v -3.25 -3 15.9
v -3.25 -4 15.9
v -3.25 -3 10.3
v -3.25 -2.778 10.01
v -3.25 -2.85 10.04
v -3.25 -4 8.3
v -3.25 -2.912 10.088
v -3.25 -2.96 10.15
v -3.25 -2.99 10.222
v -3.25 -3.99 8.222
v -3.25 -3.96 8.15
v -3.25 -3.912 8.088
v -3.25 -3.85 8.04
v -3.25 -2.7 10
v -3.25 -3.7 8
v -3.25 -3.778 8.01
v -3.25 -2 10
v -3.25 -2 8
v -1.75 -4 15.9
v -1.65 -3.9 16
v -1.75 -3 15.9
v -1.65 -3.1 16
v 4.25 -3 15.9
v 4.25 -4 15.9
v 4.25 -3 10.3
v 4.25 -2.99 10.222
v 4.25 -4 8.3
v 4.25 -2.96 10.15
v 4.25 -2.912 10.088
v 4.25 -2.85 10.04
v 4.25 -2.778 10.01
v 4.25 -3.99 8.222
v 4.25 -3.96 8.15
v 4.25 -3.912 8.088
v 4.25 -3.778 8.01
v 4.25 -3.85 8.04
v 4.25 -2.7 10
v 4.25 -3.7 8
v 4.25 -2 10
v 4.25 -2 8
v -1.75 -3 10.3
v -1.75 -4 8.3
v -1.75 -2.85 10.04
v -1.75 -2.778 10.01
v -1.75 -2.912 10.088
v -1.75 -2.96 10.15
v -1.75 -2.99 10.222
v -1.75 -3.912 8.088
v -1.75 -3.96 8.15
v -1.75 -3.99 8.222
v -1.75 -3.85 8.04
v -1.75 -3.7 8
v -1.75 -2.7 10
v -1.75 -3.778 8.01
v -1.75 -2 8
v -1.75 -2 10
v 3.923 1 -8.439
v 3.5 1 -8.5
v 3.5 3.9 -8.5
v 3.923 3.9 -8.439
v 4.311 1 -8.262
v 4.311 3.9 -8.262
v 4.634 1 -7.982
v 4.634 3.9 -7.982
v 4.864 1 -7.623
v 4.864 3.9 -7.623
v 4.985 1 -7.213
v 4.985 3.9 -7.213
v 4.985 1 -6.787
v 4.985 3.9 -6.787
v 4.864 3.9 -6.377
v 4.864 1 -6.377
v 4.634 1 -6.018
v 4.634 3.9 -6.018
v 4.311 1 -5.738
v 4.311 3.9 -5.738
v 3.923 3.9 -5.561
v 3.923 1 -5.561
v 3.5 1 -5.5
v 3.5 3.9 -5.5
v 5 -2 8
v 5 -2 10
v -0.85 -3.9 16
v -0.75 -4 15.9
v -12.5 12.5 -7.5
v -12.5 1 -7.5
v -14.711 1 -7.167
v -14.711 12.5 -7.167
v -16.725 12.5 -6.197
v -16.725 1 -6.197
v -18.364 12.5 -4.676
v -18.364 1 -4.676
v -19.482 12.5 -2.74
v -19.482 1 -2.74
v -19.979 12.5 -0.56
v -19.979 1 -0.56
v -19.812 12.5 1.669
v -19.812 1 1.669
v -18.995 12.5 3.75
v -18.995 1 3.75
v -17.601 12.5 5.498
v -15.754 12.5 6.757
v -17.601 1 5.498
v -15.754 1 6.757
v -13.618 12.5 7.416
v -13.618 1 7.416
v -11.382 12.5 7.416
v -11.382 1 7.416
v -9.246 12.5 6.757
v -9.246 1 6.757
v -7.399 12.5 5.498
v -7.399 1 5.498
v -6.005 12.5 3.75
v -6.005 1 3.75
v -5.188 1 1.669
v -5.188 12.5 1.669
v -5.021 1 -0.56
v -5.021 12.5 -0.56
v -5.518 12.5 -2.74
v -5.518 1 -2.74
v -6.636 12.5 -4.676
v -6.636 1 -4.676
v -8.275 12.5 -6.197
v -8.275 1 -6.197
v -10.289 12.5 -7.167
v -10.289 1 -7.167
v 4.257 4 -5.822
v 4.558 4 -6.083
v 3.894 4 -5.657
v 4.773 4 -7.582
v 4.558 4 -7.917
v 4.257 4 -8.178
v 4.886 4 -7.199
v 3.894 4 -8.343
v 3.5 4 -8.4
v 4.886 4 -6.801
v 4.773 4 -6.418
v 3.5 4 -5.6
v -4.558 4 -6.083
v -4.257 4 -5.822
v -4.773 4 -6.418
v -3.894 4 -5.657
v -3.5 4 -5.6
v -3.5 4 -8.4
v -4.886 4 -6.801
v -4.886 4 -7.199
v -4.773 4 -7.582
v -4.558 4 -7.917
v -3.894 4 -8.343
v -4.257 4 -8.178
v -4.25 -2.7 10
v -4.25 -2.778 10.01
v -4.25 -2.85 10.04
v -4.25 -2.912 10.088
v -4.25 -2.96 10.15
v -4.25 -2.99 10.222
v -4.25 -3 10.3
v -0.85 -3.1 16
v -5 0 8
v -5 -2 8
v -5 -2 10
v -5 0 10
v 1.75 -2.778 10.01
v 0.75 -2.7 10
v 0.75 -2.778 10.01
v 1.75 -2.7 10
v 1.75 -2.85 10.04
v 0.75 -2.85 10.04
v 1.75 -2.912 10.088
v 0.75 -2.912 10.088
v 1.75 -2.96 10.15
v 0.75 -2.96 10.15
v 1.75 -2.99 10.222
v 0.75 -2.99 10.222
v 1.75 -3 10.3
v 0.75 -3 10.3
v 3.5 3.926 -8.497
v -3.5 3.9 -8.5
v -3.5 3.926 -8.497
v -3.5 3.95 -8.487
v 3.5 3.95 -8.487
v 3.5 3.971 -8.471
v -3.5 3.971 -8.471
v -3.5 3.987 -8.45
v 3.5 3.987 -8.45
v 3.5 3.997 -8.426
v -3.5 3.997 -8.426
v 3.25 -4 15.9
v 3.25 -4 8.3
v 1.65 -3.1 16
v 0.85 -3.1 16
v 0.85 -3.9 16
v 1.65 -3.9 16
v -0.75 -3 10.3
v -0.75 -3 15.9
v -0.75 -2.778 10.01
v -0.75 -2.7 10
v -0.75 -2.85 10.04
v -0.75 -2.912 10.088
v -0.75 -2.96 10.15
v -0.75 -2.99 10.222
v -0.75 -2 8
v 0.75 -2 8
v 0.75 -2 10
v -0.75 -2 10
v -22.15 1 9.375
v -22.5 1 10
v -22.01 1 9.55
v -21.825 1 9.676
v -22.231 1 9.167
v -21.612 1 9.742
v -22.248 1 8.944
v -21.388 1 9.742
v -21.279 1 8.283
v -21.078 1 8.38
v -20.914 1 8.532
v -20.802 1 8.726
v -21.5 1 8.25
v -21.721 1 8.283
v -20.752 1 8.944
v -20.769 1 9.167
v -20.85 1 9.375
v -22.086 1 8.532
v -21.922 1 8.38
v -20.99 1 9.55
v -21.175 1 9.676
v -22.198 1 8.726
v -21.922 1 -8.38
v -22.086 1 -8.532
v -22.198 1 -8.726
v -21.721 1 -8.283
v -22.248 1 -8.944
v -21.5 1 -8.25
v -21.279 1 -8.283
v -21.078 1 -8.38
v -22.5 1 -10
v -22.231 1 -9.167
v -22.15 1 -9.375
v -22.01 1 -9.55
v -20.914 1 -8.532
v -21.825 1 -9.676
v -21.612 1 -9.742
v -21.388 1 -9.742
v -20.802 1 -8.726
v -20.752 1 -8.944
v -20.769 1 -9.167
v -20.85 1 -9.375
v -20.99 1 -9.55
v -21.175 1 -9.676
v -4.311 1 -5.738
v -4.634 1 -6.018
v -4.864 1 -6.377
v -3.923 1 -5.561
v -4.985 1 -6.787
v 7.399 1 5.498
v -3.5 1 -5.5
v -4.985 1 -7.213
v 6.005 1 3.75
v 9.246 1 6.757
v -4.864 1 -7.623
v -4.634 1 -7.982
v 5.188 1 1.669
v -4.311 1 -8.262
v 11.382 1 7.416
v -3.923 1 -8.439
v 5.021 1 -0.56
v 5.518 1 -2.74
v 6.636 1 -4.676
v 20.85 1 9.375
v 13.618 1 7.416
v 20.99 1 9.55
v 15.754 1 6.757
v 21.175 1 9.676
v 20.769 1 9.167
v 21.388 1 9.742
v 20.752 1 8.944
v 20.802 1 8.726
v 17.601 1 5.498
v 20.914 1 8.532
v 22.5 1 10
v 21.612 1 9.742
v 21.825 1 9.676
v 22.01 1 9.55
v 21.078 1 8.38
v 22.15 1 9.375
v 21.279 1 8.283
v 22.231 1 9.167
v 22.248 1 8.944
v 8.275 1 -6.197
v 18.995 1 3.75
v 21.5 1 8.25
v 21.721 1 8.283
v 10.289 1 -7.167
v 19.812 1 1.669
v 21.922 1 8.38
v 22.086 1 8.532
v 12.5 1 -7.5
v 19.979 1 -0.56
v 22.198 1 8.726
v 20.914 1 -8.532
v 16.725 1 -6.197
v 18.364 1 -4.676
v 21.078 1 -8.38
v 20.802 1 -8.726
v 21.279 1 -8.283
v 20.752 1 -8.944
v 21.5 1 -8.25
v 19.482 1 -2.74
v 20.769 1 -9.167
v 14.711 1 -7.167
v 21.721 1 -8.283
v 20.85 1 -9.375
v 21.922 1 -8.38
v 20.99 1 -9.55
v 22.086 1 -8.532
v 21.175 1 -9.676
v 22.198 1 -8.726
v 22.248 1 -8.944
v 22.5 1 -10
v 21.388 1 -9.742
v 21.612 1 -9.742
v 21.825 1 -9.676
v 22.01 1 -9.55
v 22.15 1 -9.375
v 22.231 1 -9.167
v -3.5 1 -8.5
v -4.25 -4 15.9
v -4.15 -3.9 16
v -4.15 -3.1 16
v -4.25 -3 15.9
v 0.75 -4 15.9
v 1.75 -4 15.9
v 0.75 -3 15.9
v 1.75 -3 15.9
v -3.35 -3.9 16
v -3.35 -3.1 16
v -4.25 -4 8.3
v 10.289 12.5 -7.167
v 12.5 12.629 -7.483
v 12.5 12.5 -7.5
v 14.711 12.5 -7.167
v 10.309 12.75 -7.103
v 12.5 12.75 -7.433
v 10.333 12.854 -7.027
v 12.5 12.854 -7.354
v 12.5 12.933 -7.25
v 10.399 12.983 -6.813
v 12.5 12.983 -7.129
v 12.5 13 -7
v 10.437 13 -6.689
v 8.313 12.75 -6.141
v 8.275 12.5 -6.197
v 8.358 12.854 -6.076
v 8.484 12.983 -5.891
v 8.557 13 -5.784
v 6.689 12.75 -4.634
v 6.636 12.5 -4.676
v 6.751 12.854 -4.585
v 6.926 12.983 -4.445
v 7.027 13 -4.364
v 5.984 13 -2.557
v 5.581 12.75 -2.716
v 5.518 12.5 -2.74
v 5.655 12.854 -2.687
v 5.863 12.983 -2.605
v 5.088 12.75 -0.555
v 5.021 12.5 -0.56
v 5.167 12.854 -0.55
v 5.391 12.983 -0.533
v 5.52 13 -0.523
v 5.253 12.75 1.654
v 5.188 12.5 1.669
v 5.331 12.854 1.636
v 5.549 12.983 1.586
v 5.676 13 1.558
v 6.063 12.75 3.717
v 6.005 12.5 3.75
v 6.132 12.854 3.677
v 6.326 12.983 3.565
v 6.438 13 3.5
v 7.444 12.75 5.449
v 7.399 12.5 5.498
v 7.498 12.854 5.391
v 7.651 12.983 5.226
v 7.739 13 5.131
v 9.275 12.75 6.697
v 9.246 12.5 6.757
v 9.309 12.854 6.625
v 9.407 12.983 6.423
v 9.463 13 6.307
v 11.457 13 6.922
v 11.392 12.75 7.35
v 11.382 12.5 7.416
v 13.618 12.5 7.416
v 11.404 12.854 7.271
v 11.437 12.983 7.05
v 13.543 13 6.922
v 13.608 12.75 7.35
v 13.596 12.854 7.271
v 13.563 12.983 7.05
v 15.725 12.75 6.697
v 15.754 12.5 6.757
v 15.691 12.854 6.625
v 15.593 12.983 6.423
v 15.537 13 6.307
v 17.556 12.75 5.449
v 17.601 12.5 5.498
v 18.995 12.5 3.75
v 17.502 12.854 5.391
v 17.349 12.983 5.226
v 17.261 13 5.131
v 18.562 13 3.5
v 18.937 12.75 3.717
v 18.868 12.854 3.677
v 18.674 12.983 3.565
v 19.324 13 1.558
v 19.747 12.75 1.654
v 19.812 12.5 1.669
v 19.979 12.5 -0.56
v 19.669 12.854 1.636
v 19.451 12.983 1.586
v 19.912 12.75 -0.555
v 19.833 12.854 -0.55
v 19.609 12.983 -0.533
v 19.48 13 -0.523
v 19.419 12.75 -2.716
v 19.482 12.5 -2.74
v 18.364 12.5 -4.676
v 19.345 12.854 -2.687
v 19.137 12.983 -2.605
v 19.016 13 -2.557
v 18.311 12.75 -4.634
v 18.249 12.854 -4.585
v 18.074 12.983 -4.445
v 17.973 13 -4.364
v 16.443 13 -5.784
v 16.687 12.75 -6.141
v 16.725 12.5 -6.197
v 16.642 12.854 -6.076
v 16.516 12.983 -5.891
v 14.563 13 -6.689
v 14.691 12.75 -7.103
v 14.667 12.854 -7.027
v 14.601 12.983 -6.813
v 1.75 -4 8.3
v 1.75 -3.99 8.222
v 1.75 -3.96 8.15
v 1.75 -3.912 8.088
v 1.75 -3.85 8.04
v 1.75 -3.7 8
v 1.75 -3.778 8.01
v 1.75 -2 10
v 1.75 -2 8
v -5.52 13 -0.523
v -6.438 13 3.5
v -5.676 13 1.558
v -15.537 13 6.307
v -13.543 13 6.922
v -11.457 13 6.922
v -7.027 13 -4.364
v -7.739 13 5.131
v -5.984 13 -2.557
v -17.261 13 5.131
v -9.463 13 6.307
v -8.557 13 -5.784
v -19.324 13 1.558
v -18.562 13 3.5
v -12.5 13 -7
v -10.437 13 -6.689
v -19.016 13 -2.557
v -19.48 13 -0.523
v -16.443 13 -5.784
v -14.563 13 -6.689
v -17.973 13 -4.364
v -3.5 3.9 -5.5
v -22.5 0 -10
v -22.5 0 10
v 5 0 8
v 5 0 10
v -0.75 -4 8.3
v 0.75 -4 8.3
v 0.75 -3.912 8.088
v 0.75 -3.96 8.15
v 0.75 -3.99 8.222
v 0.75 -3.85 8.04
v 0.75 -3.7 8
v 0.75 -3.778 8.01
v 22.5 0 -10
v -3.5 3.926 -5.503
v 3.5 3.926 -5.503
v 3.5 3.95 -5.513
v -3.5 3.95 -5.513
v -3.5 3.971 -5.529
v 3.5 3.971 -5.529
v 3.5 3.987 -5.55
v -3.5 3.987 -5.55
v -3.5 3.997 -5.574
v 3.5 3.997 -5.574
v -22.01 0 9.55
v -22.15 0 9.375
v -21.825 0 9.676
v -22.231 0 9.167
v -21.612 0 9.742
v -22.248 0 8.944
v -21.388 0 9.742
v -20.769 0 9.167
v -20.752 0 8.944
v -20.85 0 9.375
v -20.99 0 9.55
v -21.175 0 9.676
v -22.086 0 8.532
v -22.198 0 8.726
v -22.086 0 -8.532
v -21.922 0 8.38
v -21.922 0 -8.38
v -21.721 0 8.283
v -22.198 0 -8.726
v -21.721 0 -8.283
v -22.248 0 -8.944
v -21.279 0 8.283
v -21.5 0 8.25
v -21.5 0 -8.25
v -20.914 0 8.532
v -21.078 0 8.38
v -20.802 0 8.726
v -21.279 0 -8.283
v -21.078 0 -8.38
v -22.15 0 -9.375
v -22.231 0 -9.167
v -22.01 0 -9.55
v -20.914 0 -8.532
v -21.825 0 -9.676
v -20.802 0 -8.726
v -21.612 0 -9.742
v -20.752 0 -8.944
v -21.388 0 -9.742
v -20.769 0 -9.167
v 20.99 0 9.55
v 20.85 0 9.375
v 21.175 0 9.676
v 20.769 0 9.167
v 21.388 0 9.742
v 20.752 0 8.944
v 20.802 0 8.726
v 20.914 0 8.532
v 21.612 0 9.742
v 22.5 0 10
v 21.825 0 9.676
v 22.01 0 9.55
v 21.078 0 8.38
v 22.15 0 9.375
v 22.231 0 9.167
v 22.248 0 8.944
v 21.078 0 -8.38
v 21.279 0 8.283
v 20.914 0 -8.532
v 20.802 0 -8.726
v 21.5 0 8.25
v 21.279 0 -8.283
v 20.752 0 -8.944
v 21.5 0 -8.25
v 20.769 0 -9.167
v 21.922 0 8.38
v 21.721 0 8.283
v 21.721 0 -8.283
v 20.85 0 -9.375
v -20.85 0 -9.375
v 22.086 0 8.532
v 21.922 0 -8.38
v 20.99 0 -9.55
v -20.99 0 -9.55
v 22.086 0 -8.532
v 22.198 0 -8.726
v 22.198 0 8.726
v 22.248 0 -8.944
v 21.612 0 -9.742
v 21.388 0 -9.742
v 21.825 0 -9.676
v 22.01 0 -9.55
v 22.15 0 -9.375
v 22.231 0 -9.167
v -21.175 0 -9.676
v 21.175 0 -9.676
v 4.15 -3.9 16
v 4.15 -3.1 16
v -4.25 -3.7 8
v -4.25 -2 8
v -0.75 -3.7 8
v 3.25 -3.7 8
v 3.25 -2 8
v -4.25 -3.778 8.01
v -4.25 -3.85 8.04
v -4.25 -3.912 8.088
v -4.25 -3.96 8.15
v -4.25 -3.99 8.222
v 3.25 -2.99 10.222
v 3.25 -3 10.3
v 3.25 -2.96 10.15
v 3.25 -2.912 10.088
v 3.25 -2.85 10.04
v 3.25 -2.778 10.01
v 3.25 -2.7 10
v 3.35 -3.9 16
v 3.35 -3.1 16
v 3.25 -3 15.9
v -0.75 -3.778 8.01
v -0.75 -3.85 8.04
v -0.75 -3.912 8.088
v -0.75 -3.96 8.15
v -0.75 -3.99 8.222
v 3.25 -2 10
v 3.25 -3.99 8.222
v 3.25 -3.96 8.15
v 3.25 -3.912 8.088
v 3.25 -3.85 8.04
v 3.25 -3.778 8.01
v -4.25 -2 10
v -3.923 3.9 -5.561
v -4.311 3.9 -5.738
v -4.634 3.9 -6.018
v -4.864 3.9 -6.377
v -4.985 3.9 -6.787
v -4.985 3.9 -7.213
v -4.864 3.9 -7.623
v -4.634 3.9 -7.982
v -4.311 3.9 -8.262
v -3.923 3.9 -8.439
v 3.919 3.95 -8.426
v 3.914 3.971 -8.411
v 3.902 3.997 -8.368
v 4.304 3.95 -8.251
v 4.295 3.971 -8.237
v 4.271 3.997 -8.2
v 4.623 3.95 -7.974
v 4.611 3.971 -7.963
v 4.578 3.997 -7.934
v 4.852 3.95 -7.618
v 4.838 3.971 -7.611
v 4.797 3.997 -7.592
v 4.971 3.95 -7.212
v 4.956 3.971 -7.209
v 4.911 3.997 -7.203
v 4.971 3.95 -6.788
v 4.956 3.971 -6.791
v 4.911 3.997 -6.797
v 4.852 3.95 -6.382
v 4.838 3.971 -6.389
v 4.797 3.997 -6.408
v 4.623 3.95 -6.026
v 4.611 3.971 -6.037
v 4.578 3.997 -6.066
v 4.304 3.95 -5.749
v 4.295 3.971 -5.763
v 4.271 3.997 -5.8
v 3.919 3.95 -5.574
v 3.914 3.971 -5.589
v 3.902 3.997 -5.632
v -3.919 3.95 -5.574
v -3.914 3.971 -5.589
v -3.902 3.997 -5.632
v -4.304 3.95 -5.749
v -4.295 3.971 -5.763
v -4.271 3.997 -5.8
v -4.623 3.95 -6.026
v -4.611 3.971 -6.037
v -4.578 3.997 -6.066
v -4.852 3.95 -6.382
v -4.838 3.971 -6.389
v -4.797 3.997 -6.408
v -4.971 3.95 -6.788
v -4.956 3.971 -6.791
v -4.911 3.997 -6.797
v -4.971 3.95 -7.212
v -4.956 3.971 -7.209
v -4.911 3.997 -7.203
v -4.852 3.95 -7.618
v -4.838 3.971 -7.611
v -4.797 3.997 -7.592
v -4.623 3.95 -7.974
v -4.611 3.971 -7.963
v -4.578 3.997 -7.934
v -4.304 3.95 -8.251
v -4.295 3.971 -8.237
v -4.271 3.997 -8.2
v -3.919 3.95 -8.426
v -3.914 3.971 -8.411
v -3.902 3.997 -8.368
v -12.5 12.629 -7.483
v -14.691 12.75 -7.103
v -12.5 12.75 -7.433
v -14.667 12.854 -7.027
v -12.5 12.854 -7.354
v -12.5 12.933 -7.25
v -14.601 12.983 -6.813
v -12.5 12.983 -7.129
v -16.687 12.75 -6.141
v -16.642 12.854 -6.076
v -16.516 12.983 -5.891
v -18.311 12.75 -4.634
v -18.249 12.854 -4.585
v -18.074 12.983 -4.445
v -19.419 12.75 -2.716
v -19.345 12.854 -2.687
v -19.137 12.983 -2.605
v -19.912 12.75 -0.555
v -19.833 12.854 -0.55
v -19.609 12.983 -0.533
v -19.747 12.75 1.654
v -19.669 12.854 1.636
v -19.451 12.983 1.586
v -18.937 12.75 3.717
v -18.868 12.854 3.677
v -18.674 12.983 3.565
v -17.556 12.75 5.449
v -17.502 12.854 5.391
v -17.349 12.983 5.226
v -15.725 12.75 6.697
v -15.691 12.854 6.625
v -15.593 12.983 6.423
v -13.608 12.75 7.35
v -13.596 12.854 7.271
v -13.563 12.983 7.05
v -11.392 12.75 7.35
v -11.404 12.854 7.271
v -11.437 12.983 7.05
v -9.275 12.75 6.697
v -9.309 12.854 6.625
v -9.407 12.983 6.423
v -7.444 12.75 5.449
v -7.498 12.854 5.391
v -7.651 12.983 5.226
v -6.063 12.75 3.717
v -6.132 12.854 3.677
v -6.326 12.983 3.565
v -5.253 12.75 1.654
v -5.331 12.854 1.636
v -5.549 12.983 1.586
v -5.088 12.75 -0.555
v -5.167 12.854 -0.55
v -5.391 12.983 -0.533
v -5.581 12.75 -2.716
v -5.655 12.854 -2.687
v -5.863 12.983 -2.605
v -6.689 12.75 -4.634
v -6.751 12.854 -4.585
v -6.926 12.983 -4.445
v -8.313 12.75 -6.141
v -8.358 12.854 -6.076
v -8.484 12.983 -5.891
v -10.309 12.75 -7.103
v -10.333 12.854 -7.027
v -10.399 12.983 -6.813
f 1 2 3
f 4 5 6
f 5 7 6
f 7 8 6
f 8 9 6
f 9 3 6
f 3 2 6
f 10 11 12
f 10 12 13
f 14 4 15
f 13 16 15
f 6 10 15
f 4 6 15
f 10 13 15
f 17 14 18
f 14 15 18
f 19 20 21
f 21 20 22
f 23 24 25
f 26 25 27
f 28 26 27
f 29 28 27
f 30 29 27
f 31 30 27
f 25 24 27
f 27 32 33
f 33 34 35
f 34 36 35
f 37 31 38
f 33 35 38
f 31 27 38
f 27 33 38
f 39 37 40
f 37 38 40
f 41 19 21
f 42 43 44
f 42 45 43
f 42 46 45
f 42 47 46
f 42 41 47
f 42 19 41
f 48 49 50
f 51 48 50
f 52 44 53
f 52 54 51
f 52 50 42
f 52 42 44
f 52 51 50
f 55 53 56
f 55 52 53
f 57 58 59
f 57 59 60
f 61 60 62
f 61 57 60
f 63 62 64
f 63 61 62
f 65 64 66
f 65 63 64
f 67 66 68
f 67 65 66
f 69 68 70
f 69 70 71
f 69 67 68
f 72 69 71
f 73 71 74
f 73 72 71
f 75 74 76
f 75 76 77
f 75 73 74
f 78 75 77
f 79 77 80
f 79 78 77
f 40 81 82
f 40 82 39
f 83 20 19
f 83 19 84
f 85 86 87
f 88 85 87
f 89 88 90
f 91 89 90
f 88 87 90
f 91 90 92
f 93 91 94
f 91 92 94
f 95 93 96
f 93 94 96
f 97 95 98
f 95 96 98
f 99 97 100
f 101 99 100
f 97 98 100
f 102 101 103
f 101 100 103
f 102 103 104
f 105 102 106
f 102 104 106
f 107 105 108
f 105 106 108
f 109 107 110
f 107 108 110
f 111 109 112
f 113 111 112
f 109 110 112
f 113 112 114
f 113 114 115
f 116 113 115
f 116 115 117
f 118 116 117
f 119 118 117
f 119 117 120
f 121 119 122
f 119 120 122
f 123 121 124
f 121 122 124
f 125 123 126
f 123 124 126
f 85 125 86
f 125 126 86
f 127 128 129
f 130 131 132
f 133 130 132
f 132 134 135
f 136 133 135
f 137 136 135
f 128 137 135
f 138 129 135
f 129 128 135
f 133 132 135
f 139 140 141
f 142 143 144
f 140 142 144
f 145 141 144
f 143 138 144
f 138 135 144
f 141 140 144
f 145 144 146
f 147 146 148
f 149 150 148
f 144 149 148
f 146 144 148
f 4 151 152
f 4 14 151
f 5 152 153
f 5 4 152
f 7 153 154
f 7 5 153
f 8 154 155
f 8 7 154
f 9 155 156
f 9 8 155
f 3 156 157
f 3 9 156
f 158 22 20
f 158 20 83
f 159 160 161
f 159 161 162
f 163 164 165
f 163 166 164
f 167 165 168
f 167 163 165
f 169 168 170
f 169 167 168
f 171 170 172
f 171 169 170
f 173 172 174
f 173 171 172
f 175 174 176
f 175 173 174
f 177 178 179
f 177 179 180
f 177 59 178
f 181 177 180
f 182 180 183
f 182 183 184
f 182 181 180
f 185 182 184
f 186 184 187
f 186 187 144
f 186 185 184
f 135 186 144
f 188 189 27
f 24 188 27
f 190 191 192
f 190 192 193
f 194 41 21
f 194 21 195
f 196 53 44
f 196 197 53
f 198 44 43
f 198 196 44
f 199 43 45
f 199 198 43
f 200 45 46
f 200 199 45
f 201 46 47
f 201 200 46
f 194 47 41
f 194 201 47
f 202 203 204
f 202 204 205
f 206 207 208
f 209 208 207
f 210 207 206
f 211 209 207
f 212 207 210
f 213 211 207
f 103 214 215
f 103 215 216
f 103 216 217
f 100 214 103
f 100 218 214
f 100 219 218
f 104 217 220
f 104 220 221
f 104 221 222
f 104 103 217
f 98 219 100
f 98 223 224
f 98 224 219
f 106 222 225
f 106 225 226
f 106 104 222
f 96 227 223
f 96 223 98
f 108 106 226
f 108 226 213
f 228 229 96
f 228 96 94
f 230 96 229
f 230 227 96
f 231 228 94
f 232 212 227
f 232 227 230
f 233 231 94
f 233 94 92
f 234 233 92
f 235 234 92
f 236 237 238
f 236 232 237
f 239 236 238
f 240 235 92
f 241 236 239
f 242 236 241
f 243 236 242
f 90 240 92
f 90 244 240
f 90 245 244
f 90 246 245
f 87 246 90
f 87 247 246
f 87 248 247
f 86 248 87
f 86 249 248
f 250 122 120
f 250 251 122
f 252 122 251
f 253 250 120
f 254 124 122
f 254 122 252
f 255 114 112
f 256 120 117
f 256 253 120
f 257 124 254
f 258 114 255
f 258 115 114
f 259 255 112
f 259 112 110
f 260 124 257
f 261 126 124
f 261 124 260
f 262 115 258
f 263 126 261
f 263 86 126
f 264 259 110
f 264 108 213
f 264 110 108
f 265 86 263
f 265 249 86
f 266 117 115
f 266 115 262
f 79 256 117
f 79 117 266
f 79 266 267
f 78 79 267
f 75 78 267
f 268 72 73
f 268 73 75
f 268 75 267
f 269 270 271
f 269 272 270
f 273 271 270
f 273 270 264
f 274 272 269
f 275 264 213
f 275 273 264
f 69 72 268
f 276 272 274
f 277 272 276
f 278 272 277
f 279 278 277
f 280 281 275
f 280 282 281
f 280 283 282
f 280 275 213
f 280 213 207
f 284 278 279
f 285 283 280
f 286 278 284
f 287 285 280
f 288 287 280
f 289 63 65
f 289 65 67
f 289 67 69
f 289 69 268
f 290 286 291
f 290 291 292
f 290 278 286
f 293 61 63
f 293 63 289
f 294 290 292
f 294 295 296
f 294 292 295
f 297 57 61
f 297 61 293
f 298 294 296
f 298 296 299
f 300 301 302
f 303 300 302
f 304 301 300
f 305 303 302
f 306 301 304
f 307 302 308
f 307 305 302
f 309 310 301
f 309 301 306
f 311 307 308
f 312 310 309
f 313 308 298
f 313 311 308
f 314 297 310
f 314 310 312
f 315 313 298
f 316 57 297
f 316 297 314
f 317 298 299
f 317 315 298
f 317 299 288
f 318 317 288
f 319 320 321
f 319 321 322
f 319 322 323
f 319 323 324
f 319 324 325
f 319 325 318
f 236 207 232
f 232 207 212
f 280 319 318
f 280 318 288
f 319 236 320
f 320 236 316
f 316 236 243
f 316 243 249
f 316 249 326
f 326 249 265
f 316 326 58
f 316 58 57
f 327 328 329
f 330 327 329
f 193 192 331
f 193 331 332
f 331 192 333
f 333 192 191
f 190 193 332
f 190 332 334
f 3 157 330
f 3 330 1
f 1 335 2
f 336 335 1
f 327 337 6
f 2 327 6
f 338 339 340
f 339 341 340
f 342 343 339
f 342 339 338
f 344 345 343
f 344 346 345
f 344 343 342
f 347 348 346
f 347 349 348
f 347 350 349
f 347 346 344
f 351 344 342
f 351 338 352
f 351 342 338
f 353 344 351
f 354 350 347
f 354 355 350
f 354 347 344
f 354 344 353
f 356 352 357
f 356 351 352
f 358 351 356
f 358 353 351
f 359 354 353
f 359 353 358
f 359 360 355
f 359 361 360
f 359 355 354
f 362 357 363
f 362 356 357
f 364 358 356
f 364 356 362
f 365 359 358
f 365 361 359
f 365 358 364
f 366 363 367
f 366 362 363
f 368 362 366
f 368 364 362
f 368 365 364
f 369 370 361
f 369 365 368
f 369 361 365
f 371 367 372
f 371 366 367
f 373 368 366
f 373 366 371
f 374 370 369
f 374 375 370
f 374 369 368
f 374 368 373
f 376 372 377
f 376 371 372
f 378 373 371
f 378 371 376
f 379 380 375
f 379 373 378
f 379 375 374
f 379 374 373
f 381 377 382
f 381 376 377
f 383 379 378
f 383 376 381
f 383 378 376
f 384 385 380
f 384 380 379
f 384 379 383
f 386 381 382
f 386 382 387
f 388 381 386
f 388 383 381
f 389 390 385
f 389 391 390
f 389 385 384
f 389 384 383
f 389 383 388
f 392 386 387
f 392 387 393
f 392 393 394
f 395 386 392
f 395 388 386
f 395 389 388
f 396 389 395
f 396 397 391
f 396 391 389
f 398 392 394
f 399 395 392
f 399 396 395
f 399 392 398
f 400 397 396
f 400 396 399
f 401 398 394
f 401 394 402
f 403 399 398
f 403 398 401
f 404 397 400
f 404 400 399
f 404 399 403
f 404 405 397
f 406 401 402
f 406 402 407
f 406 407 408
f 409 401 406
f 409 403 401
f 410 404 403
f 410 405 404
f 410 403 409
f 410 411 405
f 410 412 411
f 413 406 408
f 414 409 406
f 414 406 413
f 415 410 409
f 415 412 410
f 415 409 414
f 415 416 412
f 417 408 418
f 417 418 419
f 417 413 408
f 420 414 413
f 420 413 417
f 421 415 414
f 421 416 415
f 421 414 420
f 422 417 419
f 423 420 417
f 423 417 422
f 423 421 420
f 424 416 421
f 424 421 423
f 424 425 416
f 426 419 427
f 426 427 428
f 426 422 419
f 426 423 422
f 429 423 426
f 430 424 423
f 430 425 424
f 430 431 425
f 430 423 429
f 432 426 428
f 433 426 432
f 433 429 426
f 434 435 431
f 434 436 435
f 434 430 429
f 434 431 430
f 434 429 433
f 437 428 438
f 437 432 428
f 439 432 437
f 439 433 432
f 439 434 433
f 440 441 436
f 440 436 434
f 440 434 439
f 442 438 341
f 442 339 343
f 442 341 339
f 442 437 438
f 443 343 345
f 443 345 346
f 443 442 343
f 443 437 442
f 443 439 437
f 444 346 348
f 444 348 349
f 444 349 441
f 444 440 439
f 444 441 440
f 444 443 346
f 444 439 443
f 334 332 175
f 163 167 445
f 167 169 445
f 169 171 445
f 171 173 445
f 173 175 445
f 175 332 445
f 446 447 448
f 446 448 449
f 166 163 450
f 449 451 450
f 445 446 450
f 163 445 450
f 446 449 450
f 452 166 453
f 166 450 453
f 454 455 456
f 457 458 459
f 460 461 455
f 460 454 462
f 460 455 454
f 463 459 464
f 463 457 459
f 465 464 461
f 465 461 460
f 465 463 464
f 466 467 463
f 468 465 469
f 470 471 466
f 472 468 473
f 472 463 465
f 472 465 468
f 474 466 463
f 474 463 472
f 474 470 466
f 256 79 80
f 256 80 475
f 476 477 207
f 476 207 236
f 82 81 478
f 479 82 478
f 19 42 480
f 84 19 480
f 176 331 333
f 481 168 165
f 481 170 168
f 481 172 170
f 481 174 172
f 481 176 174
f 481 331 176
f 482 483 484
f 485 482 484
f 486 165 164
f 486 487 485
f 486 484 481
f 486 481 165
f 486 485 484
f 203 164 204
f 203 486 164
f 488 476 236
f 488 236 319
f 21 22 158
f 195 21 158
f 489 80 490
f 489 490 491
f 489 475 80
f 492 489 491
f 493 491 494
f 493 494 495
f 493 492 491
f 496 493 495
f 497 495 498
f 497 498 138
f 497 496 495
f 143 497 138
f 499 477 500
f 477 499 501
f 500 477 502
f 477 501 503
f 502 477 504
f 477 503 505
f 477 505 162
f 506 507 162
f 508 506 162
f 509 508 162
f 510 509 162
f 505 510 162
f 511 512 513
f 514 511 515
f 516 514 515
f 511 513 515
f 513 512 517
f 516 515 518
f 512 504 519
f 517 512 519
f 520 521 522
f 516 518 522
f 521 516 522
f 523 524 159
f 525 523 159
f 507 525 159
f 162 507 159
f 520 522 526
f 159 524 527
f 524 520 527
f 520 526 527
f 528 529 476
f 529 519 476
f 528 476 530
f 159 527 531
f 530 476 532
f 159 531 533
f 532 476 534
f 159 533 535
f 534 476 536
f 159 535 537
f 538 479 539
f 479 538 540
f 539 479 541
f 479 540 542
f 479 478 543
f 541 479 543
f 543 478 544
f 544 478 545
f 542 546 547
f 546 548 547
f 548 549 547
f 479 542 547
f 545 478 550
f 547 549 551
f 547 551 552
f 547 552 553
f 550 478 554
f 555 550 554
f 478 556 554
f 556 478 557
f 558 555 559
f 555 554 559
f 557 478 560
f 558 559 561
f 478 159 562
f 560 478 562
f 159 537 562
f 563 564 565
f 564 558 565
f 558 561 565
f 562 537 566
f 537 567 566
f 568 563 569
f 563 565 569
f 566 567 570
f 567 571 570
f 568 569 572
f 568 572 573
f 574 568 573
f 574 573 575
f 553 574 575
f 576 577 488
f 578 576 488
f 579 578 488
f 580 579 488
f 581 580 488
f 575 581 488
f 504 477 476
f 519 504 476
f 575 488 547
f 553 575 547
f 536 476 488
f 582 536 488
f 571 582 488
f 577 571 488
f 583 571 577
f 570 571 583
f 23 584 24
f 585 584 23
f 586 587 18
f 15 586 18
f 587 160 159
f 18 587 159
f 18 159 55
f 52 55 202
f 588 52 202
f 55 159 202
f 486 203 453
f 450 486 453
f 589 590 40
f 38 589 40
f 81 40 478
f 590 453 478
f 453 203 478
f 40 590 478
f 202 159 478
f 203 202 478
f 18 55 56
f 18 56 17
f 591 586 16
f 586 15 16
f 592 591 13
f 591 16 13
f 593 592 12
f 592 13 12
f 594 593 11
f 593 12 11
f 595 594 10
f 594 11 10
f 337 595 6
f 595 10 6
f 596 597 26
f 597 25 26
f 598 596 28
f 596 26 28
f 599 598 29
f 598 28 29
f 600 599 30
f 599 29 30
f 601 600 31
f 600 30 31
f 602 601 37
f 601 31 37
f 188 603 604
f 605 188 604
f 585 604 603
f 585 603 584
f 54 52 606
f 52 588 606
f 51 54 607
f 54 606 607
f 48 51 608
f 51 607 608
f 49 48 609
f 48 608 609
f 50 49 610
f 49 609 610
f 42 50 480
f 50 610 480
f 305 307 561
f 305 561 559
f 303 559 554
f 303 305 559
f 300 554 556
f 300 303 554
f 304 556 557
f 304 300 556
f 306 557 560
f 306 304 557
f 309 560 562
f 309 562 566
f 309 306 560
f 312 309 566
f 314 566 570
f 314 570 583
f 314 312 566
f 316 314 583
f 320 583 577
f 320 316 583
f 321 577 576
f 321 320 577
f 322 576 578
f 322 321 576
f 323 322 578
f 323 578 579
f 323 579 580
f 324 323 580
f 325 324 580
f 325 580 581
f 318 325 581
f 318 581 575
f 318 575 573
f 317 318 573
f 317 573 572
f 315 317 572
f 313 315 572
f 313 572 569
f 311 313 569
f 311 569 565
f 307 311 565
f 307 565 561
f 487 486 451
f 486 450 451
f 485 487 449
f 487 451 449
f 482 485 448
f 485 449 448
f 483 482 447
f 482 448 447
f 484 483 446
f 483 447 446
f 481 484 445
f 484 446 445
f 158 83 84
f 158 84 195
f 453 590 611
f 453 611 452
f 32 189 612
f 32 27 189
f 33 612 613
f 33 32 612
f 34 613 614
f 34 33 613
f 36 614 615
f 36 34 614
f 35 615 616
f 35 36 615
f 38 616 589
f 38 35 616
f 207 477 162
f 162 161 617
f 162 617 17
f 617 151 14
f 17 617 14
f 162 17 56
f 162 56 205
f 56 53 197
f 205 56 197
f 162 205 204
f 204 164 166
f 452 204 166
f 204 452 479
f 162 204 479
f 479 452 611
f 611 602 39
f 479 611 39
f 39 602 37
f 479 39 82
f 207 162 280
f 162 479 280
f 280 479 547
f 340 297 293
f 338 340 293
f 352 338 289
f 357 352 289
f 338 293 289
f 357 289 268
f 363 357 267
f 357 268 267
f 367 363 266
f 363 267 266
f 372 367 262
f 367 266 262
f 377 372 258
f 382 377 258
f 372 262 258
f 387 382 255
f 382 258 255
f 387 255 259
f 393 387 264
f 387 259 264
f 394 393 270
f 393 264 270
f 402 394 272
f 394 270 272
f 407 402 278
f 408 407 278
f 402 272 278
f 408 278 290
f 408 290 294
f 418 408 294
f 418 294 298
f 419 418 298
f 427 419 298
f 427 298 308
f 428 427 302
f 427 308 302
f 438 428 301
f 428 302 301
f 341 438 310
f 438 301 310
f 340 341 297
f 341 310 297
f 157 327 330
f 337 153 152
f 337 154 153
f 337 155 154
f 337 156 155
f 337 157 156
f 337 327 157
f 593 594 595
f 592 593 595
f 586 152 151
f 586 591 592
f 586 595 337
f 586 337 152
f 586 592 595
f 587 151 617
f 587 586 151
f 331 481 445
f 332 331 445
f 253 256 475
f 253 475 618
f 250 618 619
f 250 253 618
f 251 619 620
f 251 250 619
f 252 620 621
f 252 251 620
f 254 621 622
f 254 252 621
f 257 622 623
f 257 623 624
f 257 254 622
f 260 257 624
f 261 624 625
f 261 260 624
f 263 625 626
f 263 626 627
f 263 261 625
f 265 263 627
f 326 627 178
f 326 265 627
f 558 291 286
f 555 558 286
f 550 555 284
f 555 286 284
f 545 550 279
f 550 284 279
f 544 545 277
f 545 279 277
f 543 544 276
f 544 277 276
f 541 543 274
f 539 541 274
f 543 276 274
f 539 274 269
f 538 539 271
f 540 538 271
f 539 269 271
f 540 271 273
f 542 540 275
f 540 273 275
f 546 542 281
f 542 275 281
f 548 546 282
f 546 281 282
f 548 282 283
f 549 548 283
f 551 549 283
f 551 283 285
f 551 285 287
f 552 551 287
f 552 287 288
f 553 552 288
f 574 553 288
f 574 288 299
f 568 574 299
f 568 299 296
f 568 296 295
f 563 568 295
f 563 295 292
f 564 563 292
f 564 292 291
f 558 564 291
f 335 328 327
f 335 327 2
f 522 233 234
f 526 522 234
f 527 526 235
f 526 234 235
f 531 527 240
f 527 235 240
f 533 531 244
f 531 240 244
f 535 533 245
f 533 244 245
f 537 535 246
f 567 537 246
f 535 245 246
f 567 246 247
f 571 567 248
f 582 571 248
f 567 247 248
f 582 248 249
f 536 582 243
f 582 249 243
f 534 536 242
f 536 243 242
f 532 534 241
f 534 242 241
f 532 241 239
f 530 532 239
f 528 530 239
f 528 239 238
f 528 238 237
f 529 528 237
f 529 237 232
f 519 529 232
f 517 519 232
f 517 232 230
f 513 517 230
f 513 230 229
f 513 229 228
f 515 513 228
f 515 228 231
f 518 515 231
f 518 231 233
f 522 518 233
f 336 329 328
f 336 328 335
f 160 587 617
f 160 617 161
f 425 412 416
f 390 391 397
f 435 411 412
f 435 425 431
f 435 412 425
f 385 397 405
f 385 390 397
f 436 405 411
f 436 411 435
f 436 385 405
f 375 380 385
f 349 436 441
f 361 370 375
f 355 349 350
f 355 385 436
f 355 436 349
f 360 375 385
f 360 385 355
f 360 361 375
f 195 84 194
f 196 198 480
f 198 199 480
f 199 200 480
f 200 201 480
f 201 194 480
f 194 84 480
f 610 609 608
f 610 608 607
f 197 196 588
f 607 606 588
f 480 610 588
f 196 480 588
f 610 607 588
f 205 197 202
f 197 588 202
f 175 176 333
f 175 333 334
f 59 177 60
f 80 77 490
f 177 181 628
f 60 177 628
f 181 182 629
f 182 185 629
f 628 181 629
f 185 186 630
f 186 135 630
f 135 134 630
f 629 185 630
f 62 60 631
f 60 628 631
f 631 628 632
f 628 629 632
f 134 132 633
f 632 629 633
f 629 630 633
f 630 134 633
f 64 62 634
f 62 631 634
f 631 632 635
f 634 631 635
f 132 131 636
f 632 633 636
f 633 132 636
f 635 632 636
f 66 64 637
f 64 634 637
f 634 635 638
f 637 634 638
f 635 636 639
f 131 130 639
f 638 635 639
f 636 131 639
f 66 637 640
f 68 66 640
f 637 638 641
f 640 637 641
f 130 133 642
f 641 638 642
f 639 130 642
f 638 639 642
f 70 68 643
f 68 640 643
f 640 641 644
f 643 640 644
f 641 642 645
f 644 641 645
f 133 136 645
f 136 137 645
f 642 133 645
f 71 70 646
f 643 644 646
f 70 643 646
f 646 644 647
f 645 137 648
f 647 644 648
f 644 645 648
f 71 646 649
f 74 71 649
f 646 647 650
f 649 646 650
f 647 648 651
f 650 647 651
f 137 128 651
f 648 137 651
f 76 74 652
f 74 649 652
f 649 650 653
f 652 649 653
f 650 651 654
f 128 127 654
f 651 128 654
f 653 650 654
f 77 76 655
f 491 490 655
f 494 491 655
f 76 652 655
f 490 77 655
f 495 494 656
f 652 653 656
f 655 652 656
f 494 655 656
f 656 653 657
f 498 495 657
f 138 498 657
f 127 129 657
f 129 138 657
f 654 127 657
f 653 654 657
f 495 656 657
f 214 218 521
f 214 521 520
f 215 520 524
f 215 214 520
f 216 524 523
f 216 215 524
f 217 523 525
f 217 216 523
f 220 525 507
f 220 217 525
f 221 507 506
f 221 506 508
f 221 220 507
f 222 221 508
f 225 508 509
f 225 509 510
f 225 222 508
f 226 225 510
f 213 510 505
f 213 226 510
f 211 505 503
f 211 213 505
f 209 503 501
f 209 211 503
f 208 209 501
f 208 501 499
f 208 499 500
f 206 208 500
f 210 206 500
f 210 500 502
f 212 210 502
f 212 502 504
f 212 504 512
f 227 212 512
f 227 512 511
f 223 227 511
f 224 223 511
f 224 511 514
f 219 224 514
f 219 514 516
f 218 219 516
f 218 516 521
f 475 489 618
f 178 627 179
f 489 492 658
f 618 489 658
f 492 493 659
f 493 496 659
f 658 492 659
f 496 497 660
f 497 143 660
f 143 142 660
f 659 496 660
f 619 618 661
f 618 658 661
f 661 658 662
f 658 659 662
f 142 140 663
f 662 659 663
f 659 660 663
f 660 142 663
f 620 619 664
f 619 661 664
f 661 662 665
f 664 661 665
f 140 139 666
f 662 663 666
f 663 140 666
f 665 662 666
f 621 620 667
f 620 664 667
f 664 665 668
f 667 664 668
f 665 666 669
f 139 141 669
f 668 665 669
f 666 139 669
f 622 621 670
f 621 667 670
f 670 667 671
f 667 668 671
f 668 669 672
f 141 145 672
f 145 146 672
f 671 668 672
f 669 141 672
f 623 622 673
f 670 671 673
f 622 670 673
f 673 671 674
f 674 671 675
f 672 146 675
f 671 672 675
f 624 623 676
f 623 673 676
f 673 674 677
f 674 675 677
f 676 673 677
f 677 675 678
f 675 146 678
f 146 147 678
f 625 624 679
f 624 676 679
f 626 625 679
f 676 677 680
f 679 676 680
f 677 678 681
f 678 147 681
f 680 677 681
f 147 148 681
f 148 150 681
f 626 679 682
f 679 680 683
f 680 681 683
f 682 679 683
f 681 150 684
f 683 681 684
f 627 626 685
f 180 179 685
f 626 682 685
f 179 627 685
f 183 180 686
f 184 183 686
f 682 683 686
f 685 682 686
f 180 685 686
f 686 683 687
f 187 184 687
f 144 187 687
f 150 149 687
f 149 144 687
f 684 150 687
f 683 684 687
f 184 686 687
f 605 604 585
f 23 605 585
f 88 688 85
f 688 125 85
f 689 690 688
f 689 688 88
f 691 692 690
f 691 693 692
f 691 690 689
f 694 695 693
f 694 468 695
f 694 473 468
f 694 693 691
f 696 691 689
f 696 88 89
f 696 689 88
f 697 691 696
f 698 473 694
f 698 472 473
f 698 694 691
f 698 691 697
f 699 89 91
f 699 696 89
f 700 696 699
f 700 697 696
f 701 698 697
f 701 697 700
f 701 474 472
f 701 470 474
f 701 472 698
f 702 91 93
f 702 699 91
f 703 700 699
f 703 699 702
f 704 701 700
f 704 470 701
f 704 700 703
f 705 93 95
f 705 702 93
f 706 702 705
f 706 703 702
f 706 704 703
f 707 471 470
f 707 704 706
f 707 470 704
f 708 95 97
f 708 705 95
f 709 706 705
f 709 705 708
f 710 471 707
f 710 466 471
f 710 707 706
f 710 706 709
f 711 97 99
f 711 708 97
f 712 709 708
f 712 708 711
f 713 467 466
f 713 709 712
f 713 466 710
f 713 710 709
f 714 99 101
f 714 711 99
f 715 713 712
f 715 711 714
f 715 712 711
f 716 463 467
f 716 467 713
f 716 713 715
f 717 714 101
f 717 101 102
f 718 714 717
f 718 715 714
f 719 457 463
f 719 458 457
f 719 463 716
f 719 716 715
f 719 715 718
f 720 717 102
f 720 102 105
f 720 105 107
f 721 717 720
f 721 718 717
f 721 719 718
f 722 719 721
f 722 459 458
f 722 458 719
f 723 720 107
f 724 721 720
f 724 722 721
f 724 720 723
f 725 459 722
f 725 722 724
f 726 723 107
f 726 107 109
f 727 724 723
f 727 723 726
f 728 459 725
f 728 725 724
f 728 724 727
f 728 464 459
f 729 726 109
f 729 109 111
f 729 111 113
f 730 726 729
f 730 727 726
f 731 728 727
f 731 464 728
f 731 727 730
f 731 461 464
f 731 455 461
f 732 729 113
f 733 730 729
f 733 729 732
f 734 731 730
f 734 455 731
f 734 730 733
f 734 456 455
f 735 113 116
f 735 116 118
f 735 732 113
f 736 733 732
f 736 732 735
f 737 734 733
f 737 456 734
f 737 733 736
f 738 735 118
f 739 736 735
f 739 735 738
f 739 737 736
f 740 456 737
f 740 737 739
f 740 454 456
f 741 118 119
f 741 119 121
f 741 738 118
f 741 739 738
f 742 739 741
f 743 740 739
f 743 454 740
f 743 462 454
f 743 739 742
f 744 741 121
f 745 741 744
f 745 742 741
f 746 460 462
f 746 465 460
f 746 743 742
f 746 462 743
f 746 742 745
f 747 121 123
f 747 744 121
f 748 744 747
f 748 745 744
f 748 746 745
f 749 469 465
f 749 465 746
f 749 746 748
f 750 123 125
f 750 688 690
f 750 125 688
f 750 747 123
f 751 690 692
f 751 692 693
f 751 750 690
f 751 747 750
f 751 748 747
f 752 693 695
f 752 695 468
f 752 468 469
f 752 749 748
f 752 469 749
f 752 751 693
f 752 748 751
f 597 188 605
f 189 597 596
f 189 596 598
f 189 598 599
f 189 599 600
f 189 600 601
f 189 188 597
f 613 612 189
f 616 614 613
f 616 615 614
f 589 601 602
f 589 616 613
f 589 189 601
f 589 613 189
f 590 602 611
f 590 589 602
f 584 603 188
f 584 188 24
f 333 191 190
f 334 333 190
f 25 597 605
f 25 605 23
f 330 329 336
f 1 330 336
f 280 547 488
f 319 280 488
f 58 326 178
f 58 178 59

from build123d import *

# Parameters (mm, degrees)
ESQUISSE1_W               = 45
ESQUISSE1_H               = 20
BOSS_EXTRU_1_DEPTH        = 1
ENL_V_MAT_EXTRU_1_REACH   = 26.642
ESQUISSE2_R               = 0.75
SYM_TRIE2_COPY_1_REACH    = 26.642
SYM_TRIE2_COPY_1_SKETCH_R = 0.75
ESQUISSE3_R               = 7.5
BOSS_EXTRU_2_DEPTH        = 12
CONG_1_R                  = 0.5
BOSS_EXTRU_3_DEPTH        = 3
CONG_2_R                  = 0.1
ESQUISSE5_W               = 10
ESQUISSE5_H               = 2
BOSS_EXTRU_4_DEPTH        = 4
ESQUISSE6_W               = 10
ESQUISSE6_H               = 1
BOSS_EXTRU_5_DEPTH        = 6
ENL_V_MAT_EXTRU_2_REACH   = 33.611
ESQUISSE7_W               = 1.5
ESQUISSE7_H               = 2
ESQUISSE7_W_2             = 0.75
CHANFREIN1_SIZE           = 0.1
CONG_3_R                  = 0.3


with BuildPart() as part:
    # Esquisse1 → Boss.-Extru.1 (new body)
    with BuildSketch(Plane(origin=(0, 0, 0), x_dir=(1, 0, 0), z_dir=(0, 1, 0))):
        Rectangle(ESQUISSE1_W, ESQUISSE1_H)
    extrude(amount=BOSS_EXTRU_1_DEPTH)

    # Esquisse2 → Enlèv. mat.-Extru.1 (cut, up to next)
    with BuildSketch(Plane(origin=(0, 1, 0), x_dir=(1, 0, 0), z_dir=(0, 1, 0)), mode=Mode.PRIVATE) as enl_v_mat_extru_1_sk1:
        with Locations(Location((-21.5, 9, 0), (0, 0, 270))):
            Circle(ESQUISSE2_R)
    enl_v_mat_extru_1_tool1 = extrude(enl_v_mat_extru_1_sk1.sketch, amount=-ENL_V_MAT_EXTRU_1_REACH, mode=Mode.PRIVATE) & part.part
    enl_v_mat_extru_1 = enl_v_mat_extru_1_tool1.solids().sort_by_distance((-21.5, 1, -9))[0]
    add(enl_v_mat_extru_1, mode=Mode.SUBTRACT)

    # Symétrie1: Enlèv. mat.-Extru.1 across plane
    add(enl_v_mat_extru_1.mirror(Plane(origin=(0, 0, 0), x_dir=(0, 0, 1), z_dir=(1, 0, 0))), mode=Mode.SUBTRACT)

    # Symétrie2: Enlèv. mat.-Extru.1 across plane
    add(enl_v_mat_extru_1.mirror(Plane.XY), mode=Mode.SUBTRACT)

    # Symétrie2 copy 1 sketch → Symétrie2 copy 1 (cut, up to next)
    with BuildSketch(Plane(origin=(0, 1, 0), x_dir=(-1, 0, 0), z_dir=(0, 1, 0)), mode=Mode.PRIVATE) as sym_trie2_copy_1_sk1:
        with Locations(Location((-21.5, 9, 0), (0, 0, 270))):
            Circle(SYM_TRIE2_COPY_1_SKETCH_R)
    sym_trie2_copy_1_tool1 = extrude(sym_trie2_copy_1_sk1.sketch, amount=-SYM_TRIE2_COPY_1_REACH, mode=Mode.PRIVATE) & part.part
    add(sym_trie2_copy_1_tool1.solids().sort_by_distance((21.5, 1, 9))[0], mode=Mode.SUBTRACT)

    # Esquisse3 → Boss.-Extru.2 (add)
    with BuildSketch(Plane(origin=(0, 1, 0), x_dir=(1, 0, 0), z_dir=(0, 1, 0))):
        with Locations(Location((-12.5, 0, 0), (0, 0, 90))):
            Circle(ESQUISSE3_R)
        with Locations(Location((12.5, 0, 0), (0, 0, 90))):
            Circle(ESQUISSE3_R)
    extrude(amount=BOSS_EXTRU_2_DEPTH)

    # Congé1
    cong_1_edges = [part.edges().sort_by_distance(p)[0] for p in [
        (-12.5, 13, 7.5),
        (12.5, 13, 7.5),
    ]]
    fillet(cong_1_edges, radius=CONG_1_R)

    # Esquisse4 → Boss.-Extru.3 (add)
    with BuildSketch(Plane(origin=(0, 1, 0), x_dir=(1, 0, 0), z_dir=(0, 1, 0))):
        with BuildLine():
            Line((-3.5, 8.5), (3.5, 8.5))
            ThreePointArc((3.5, 8.5), (5, 7), (3.5, 5.5))
            Line((3.5, 5.5), (-3.5, 5.5))
            ThreePointArc((-3.5, 5.5), (-5, 7), (-3.5, 8.5))
        make_face()
    extrude(amount=BOSS_EXTRU_3_DEPTH)

    # Congé2
    cong_2_edges = [part.edges().sort_by_distance(p)[0] for p in [
        (-5, 4, -7),
        (0, 4, -5.5),
        (5, 4, -7),
        (0, 4, -8.5),
    ]]
    fillet(cong_2_edges, radius=CONG_2_R)

    # Esquisse5 → Boss.-Extru.4 (add)
    with BuildSketch(Plane.XZ):
        with Locations((0, 9)):
            Rectangle(ESQUISSE5_W, ESQUISSE5_H)
    extrude(amount=BOSS_EXTRU_4_DEPTH)

    # Esquisse6 → Boss.-Extru.5 (add)
    with BuildSketch(Plane.XY.offset(10)):
        with Locations((0, -3.5)):
            Rectangle(ESQUISSE6_W, ESQUISSE6_H)
    extrude(amount=BOSS_EXTRU_5_DEPTH)

    # Esquisse7 → Enlèv. mat.-Extru.2 (cut, up to next)
    with BuildSketch(Plane(origin=(0, 0, 8), x_dir=(-1, 0, 0), z_dir=(0, 0, -1)), mode=Mode.PRIVATE) as enl_v_mat_extru_2_sk1:
        with Locations((-2.5, -3)):
            Rectangle(ESQUISSE7_W, ESQUISSE7_H)
    enl_v_mat_extru_2_tool1 = extrude(enl_v_mat_extru_2_sk1.sketch, amount=-ENL_V_MAT_EXTRU_2_REACH, mode=Mode.PRIVATE) & part.part
    # Esquisse7 → Enlèv. mat.-Extru.2 (cut, up to next)
    with BuildSketch(Plane(origin=(0, 0, 8), x_dir=(-1, 0, 0), z_dir=(0, 0, -1)), mode=Mode.PRIVATE) as enl_v_mat_extru_2_sk2:
        with Locations((-4.625, -3)):
            Rectangle(ESQUISSE7_W_2, ESQUISSE7_H)
    enl_v_mat_extru_2_tool2 = extrude(enl_v_mat_extru_2_sk2.sketch, amount=-ENL_V_MAT_EXTRU_2_REACH, mode=Mode.PRIVATE) & part.part
    # Esquisse7 → Enlèv. mat.-Extru.2 (cut, up to next)
    with BuildSketch(Plane(origin=(0, 0, 8), x_dir=(-1, 0, 0), z_dir=(0, 0, -1)), mode=Mode.PRIVATE) as enl_v_mat_extru_2_sk3:
        with Locations((0, -3)):
            Rectangle(ESQUISSE7_W, ESQUISSE7_H)
    enl_v_mat_extru_2_tool3 = extrude(enl_v_mat_extru_2_sk3.sketch, amount=-ENL_V_MAT_EXTRU_2_REACH, mode=Mode.PRIVATE) & part.part
    # Esquisse7 → Enlèv. mat.-Extru.2 (cut, up to next)
    with BuildSketch(Plane(origin=(0, 0, 8), x_dir=(-1, 0, 0), z_dir=(0, 0, -1)), mode=Mode.PRIVATE) as enl_v_mat_extru_2_sk4:
        with Locations((2.5, -3)):
            Rectangle(ESQUISSE7_W, ESQUISSE7_H)
    enl_v_mat_extru_2_tool4 = extrude(enl_v_mat_extru_2_sk4.sketch, amount=-ENL_V_MAT_EXTRU_2_REACH, mode=Mode.PRIVATE) & part.part
    # Esquisse7 → Enlèv. mat.-Extru.2 (cut, up to next)
    with BuildSketch(Plane(origin=(0, 0, 8), x_dir=(-1, 0, 0), z_dir=(0, 0, -1)), mode=Mode.PRIVATE) as enl_v_mat_extru_2_sk5:
        with Locations((4.625, -3)):
            Rectangle(ESQUISSE7_W_2, ESQUISSE7_H)
    enl_v_mat_extru_2_tool5 = extrude(enl_v_mat_extru_2_sk5.sketch, amount=-ENL_V_MAT_EXTRU_2_REACH, mode=Mode.PRIVATE) & part.part
    add(enl_v_mat_extru_2_tool1.solids().sort_by_distance((2.5, -3, 8))[0], mode=Mode.SUBTRACT)
    add(enl_v_mat_extru_2_tool2.solids().sort_by_distance((4.625, -3, 8))[0], mode=Mode.SUBTRACT)
    add(enl_v_mat_extru_2_tool3.solids().sort_by_distance((0, -3, 8))[0], mode=Mode.SUBTRACT)
    add(enl_v_mat_extru_2_tool4.solids().sort_by_distance((-2.5, -3, 8))[0], mode=Mode.SUBTRACT)
    add(enl_v_mat_extru_2_tool5.solids().sort_by_distance((-4.625, -3, 8))[0], mode=Mode.SUBTRACT)

    # Chanfrein1
    chanfrein1_edges = [part.edges().sort_by_distance(p)[0] for p in [
        (-3.75, -3, 16),
        (-4.25, -3.5, 16),
        (-1.75, -3.5, 16),
        (-3.25, -3.5, 16),
        (0.75, -3.5, 16),
        (-0.75, -3.5, 16),
        (4.25, -3.5, 16),
        (3.25, -3.5, 16),
        (1.75, -3.5, 16),
        (-3.75, -4, 16),
        (-1.25, -4, 16),
        (1.25, -4, 16),
        (3.75, -4, 16),
        (3.75, -3, 16),
        (1.25, -3, 16),
        (-1.25, -3, 16),
    ]]
    chamfer(chanfrein1_edges, length=CHANFREIN1_SIZE)

    # Congé3
    cong_3_edges = [part.edges().sort_by_distance(p)[0] for p in [
        (3.75, -3, 10),
        (1.25, -3, 10),
        (-1.25, -3, 10),
        (-3.75, -3, 10),
        (-3.75, -4, 8),
        (-1.25, -4, 8),
        (1.25, -4, 8),
        (3.75, -4, 8),
    ]]
    fillet(cong_3_edges, radius=CONG_3_R)


solid = part.part
